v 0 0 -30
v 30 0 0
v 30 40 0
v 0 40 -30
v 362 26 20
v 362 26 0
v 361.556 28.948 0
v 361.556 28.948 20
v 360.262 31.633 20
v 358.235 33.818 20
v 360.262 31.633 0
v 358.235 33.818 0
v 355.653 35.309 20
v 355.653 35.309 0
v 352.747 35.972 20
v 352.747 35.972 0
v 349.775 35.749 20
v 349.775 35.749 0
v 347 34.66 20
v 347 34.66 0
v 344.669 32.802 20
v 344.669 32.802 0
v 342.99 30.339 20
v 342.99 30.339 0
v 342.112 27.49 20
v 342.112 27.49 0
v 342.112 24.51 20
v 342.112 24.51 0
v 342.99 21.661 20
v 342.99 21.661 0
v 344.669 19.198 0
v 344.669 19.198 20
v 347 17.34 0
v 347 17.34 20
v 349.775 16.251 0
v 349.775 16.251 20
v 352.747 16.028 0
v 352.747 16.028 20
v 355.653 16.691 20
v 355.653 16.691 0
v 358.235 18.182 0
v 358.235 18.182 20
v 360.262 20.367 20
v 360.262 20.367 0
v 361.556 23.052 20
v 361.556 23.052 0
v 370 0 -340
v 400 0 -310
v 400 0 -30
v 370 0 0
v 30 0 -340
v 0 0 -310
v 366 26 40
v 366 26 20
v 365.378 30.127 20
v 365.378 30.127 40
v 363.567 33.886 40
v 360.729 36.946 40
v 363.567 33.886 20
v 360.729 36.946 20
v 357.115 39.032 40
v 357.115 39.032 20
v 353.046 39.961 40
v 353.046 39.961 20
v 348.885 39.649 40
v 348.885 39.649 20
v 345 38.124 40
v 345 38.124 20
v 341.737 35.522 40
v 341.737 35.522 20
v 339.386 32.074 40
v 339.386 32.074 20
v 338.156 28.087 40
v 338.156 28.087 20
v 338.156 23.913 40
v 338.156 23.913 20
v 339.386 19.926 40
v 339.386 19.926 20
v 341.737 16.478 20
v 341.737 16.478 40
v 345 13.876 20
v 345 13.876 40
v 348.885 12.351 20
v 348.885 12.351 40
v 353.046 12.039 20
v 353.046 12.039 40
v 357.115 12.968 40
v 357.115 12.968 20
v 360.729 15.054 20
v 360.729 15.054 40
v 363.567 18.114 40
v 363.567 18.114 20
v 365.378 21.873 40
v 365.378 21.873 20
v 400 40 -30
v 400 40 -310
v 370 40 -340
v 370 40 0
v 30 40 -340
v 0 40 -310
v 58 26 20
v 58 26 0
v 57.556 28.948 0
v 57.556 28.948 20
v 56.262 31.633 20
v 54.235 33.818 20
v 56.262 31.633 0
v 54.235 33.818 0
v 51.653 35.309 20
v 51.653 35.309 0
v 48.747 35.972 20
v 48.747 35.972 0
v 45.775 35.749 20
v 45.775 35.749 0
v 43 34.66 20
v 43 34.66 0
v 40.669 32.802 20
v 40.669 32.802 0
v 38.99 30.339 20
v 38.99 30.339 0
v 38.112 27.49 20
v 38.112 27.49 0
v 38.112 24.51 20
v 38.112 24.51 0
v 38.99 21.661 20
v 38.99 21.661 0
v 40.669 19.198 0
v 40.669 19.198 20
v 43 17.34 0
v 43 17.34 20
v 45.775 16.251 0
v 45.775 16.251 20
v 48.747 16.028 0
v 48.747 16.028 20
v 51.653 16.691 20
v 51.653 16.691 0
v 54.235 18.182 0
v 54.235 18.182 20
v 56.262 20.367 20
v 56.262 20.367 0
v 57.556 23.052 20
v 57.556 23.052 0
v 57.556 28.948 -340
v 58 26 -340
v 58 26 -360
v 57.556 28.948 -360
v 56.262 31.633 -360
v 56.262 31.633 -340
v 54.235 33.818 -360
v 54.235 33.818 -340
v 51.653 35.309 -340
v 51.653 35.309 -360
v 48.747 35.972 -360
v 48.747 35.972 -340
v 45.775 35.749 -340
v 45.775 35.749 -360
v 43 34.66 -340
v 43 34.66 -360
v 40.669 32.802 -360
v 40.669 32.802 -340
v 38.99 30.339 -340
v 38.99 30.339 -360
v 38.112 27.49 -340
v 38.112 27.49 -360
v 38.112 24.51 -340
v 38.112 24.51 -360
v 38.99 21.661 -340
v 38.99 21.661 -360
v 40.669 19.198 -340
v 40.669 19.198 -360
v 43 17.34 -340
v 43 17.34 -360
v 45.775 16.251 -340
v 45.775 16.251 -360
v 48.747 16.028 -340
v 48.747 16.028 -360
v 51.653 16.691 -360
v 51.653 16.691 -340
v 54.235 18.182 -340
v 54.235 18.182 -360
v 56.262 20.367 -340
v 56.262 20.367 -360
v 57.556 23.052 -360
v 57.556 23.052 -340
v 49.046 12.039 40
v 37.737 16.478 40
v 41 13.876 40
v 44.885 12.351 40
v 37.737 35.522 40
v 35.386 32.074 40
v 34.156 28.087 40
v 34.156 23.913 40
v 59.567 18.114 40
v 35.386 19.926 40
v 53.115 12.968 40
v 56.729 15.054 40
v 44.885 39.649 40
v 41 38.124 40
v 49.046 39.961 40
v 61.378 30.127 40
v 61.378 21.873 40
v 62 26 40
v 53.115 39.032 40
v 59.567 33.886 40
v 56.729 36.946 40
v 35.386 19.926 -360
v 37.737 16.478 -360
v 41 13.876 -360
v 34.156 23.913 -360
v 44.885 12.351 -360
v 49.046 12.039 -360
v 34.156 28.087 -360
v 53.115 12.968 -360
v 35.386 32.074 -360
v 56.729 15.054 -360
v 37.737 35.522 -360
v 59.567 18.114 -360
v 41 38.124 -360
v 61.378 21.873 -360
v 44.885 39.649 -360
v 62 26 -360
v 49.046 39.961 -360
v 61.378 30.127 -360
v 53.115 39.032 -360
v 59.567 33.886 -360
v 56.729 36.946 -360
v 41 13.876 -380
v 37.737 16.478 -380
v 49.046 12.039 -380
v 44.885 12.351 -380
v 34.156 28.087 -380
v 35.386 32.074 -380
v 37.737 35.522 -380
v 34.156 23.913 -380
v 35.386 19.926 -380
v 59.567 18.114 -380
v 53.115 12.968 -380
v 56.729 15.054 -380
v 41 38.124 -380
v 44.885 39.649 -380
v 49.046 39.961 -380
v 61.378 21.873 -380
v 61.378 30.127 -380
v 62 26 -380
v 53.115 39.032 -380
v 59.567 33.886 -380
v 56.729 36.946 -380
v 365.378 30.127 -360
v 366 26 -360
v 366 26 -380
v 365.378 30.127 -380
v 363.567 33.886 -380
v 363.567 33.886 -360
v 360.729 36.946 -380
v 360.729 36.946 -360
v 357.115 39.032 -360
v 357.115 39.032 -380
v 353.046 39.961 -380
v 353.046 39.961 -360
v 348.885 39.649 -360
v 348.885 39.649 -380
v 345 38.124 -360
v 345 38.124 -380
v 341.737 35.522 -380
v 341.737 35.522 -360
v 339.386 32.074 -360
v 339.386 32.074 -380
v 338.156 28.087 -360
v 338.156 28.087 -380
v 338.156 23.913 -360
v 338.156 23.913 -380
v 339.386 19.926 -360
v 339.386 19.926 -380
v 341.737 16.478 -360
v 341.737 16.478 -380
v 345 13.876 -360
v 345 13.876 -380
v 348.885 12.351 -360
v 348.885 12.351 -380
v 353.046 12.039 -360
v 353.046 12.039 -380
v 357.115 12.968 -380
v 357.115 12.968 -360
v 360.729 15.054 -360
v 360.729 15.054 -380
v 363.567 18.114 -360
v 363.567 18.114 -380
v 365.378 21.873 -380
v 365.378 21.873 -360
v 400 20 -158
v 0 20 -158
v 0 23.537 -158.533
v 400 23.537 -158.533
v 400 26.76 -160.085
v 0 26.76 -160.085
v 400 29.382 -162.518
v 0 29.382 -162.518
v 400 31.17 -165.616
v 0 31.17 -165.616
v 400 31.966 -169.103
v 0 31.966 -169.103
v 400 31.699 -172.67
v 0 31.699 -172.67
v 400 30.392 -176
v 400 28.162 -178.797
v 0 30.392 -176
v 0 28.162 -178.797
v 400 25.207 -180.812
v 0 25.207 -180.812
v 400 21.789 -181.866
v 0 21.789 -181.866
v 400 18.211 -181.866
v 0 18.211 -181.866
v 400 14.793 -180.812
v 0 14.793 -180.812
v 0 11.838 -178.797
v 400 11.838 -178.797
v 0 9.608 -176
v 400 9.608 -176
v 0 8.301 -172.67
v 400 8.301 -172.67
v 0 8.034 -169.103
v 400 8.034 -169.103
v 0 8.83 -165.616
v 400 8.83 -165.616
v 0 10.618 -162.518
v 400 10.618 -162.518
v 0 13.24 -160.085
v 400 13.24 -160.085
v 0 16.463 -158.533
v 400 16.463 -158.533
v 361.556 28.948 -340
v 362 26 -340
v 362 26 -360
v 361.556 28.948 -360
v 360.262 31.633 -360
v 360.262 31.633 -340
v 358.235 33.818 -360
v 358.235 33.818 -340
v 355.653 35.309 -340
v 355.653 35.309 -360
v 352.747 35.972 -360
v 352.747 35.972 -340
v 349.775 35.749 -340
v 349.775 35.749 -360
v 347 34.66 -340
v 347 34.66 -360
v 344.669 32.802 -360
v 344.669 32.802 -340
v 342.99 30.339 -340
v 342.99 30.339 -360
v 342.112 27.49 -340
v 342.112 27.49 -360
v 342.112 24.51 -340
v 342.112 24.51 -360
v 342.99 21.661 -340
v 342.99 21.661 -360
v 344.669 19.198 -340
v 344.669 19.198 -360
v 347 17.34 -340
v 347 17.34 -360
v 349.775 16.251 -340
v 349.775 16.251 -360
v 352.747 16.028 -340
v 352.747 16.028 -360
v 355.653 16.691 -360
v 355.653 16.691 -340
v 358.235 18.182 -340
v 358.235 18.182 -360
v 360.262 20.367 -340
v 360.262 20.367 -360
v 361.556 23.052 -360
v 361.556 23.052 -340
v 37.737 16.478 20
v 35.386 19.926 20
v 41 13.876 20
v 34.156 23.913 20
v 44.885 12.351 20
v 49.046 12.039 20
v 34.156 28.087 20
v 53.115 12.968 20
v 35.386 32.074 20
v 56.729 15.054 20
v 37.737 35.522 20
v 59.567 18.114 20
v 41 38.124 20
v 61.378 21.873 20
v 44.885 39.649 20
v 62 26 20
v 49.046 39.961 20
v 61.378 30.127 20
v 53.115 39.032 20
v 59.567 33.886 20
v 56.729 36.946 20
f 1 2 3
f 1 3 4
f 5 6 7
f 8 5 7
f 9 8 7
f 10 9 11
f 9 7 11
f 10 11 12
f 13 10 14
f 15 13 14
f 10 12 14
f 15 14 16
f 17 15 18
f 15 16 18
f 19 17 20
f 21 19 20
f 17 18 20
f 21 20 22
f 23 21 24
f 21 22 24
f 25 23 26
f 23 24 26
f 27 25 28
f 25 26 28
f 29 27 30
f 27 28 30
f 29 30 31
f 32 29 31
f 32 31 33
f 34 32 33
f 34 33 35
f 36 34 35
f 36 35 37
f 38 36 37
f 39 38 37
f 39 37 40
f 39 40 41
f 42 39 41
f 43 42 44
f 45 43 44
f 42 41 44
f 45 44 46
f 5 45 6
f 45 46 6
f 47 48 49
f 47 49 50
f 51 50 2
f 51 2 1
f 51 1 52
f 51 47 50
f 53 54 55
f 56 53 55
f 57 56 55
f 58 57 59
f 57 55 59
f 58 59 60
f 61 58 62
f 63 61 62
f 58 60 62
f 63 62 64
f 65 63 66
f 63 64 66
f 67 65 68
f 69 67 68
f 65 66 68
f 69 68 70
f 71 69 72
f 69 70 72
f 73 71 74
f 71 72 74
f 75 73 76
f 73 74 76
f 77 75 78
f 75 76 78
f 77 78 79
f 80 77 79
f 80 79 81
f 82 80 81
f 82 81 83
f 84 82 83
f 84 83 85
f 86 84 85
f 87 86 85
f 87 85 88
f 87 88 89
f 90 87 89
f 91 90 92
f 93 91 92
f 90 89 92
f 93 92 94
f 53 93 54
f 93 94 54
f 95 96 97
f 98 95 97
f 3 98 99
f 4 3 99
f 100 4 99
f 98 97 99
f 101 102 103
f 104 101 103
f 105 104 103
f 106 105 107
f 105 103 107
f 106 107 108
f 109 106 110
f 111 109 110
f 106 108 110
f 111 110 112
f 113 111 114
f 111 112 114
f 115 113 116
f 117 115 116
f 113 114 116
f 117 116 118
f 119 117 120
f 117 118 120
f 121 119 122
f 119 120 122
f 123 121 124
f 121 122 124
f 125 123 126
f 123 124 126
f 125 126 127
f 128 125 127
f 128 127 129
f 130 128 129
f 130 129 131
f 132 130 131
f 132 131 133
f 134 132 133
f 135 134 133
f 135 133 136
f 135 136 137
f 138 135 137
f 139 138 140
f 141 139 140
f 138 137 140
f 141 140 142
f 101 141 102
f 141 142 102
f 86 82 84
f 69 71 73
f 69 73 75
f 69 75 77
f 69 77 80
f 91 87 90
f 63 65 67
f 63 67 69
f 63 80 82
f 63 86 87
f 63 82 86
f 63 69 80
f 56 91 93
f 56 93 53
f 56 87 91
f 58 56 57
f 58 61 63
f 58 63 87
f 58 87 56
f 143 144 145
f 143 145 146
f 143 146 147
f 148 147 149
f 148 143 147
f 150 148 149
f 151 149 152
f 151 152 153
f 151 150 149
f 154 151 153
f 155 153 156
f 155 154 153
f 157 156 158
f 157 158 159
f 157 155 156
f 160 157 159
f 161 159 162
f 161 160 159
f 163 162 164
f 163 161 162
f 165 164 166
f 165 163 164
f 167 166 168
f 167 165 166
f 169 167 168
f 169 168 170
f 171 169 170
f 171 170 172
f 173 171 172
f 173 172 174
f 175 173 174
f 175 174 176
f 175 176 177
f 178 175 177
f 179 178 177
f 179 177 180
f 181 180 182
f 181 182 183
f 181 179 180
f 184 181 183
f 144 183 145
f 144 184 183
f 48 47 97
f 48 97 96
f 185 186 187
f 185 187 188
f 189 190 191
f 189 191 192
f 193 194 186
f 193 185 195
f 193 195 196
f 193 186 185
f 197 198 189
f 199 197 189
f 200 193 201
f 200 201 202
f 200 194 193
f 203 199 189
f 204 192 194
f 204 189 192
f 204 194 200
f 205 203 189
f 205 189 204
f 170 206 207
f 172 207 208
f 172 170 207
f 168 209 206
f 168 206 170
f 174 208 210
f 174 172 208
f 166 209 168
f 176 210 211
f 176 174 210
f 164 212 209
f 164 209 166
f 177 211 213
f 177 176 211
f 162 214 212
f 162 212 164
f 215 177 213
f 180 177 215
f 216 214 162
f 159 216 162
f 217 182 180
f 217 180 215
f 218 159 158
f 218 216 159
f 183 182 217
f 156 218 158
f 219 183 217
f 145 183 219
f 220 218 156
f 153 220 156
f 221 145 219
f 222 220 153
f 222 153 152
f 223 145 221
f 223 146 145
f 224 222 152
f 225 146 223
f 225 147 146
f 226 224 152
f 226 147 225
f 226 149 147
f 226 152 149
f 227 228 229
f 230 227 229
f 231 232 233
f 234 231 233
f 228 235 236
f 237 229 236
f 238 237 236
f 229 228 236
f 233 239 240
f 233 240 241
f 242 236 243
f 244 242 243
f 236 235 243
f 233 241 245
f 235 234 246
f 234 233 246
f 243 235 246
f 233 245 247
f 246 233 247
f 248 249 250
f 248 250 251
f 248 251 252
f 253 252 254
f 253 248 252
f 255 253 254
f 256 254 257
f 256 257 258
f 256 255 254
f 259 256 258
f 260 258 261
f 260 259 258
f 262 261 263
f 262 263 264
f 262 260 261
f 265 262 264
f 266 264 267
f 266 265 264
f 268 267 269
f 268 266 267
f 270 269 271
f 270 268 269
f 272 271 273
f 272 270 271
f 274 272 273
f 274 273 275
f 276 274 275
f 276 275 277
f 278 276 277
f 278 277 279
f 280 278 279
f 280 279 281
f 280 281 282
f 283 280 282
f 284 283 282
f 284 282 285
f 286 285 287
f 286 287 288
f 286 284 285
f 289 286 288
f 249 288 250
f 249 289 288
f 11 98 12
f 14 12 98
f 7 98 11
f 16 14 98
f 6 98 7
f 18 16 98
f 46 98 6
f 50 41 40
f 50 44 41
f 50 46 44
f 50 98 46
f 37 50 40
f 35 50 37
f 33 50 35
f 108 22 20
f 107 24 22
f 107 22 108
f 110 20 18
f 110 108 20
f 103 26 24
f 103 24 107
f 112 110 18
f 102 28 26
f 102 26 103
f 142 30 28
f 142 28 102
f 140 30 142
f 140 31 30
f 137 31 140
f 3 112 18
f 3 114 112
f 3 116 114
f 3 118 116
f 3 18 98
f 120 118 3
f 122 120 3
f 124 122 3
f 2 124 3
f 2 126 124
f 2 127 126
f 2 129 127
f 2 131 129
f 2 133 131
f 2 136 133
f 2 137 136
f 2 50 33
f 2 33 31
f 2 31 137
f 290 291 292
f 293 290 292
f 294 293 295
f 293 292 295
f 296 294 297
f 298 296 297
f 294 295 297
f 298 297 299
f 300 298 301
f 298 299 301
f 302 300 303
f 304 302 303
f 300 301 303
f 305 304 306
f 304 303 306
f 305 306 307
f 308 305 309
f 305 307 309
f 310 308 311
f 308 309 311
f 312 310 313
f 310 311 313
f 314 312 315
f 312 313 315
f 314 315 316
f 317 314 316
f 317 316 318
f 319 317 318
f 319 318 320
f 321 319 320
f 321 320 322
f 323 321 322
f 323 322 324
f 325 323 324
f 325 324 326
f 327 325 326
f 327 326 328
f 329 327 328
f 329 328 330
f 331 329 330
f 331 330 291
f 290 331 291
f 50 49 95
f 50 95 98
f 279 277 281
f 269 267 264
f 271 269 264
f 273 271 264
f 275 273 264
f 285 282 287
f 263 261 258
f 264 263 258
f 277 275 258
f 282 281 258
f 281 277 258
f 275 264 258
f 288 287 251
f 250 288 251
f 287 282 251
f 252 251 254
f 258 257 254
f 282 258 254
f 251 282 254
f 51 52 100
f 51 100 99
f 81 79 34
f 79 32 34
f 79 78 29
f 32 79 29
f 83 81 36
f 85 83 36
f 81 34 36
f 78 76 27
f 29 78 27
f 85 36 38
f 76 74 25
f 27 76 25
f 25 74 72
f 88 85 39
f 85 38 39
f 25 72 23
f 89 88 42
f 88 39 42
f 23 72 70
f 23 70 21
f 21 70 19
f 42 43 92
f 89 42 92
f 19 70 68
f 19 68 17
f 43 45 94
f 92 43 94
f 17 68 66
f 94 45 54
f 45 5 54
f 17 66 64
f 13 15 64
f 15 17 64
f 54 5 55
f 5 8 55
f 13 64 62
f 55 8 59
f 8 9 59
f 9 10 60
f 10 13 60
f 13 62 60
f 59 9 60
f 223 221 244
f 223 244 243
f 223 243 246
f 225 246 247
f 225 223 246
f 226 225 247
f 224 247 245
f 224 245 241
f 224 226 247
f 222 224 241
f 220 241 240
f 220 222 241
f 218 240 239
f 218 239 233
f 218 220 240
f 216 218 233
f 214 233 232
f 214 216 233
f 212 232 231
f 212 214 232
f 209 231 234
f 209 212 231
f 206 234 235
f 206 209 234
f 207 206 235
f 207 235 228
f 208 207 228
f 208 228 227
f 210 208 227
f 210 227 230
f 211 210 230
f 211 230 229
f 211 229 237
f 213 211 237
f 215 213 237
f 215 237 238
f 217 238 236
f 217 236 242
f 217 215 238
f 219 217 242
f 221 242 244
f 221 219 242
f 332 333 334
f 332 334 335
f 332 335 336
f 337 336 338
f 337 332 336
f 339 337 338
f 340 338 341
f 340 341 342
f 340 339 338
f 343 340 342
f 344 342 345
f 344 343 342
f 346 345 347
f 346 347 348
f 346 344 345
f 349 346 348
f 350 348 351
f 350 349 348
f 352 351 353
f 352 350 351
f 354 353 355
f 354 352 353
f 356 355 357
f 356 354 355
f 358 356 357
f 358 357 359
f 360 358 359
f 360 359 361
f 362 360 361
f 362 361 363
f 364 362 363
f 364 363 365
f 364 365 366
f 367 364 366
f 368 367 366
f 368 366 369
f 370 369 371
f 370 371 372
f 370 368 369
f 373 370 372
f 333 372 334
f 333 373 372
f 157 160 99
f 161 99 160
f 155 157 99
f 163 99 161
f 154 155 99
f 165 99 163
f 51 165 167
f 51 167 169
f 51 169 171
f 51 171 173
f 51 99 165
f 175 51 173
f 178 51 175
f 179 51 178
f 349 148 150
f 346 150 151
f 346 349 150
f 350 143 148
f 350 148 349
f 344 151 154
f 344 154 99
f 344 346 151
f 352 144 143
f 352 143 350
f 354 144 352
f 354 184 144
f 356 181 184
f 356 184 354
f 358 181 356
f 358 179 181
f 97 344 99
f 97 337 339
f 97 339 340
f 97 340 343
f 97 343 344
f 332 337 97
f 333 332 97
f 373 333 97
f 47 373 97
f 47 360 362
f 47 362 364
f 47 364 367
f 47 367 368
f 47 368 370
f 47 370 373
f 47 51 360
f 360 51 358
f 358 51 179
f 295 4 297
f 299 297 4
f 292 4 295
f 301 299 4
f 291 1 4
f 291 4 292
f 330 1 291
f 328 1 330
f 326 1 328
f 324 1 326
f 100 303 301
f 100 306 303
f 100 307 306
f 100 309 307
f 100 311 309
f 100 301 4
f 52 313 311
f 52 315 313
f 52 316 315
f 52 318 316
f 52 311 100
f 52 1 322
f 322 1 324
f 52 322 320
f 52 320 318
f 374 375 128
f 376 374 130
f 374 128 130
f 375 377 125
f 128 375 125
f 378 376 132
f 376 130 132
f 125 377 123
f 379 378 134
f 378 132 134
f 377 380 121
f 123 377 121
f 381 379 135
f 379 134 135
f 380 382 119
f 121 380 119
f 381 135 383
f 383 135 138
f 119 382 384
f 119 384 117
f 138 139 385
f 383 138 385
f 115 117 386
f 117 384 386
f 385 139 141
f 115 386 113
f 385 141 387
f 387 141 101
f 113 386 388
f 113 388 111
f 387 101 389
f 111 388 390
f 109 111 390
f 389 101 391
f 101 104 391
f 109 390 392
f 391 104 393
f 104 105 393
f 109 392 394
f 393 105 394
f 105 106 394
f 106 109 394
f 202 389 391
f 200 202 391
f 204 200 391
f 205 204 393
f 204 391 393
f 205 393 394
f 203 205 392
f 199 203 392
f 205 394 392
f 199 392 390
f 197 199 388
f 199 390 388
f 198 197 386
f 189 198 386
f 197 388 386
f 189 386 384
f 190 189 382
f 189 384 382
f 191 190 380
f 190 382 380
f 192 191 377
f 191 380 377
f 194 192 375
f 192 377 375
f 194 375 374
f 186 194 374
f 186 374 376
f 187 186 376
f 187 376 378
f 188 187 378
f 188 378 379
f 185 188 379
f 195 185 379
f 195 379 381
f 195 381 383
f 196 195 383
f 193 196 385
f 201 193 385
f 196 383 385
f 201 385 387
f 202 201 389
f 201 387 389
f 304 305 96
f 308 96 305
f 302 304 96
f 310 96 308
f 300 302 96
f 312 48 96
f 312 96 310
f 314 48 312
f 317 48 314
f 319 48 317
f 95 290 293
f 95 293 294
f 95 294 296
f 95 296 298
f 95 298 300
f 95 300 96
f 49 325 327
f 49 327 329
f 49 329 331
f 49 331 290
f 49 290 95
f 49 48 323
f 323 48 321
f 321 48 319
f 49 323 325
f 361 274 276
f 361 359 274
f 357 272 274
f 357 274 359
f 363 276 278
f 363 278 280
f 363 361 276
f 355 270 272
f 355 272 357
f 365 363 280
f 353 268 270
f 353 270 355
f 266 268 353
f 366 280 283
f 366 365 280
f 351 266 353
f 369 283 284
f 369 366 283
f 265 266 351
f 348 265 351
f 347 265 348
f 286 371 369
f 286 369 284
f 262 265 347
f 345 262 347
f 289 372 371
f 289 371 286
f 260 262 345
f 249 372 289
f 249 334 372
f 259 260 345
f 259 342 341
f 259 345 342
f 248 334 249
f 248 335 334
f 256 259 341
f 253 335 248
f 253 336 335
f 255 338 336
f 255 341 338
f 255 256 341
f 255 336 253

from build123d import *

# Parameters (mm, degrees)
BOSS_EXTRUDE1_DEPTH = 40
SKETCH2_R           = 12
CUT_EXTRUDE1_DEPTH  = 401
SKETCH3_R           = 10
BOSS_EXTRUDE2_DEPTH = 20
SKETCH4_R           = 14
BOSS_EXTRUDE3_DEPTH = 20


with BuildPart() as part:
    # Sketch1 → Boss-Extrude1 (new body)
    with BuildSketch(Plane(origin=(0, 0, 0), x_dir=(1, 0, 0), z_dir=(0, 1, 0))):
        Polygon((0, 310), (30, 340), (370, 340), (400, 310), (400, 30), (370, 0), (30, 0), (0, 30), align=None)
    extrude(amount=BOSS_EXTRUDE1_DEPTH)

    # Sketch2 → Cut-Extrude1 (cut, through all)
    with BuildSketch(Plane.ZY):
        with Locations((-170, 20)):
            Circle(SKETCH2_R)
    extrude(amount=-CUT_EXTRUDE1_DEPTH, mode=Mode.SUBTRACT)

    # Sketch3 → Boss-Extrude2 (add)
    with BuildSketch(Plane.XY):
        with Locations((48, 26)):
            Circle(SKETCH3_R)
        with Locations((352, 26)):
            Circle(SKETCH3_R)
    boss_extrude2 = extrude(amount=BOSS_EXTRUDE2_DEPTH)

    # Sketch4 → Boss-Extrude3 (add)
    with BuildSketch(Plane.XY.offset(20)):
        with Locations((48, 26)):
            Circle(SKETCH4_R)
        with Locations((352, 26)):
            Circle(SKETCH4_R)
    boss_extrude3 = extrude(amount=BOSS_EXTRUDE3_DEPTH)

    # Mirror1: Boss-Extrude2, Boss-Extrude3 across plane
    add(boss_extrude2.mirror(Plane.XY.offset(-170)))
    add(boss_extrude3.mirror(Plane.XY.offset(-170)))


solid = part.part
